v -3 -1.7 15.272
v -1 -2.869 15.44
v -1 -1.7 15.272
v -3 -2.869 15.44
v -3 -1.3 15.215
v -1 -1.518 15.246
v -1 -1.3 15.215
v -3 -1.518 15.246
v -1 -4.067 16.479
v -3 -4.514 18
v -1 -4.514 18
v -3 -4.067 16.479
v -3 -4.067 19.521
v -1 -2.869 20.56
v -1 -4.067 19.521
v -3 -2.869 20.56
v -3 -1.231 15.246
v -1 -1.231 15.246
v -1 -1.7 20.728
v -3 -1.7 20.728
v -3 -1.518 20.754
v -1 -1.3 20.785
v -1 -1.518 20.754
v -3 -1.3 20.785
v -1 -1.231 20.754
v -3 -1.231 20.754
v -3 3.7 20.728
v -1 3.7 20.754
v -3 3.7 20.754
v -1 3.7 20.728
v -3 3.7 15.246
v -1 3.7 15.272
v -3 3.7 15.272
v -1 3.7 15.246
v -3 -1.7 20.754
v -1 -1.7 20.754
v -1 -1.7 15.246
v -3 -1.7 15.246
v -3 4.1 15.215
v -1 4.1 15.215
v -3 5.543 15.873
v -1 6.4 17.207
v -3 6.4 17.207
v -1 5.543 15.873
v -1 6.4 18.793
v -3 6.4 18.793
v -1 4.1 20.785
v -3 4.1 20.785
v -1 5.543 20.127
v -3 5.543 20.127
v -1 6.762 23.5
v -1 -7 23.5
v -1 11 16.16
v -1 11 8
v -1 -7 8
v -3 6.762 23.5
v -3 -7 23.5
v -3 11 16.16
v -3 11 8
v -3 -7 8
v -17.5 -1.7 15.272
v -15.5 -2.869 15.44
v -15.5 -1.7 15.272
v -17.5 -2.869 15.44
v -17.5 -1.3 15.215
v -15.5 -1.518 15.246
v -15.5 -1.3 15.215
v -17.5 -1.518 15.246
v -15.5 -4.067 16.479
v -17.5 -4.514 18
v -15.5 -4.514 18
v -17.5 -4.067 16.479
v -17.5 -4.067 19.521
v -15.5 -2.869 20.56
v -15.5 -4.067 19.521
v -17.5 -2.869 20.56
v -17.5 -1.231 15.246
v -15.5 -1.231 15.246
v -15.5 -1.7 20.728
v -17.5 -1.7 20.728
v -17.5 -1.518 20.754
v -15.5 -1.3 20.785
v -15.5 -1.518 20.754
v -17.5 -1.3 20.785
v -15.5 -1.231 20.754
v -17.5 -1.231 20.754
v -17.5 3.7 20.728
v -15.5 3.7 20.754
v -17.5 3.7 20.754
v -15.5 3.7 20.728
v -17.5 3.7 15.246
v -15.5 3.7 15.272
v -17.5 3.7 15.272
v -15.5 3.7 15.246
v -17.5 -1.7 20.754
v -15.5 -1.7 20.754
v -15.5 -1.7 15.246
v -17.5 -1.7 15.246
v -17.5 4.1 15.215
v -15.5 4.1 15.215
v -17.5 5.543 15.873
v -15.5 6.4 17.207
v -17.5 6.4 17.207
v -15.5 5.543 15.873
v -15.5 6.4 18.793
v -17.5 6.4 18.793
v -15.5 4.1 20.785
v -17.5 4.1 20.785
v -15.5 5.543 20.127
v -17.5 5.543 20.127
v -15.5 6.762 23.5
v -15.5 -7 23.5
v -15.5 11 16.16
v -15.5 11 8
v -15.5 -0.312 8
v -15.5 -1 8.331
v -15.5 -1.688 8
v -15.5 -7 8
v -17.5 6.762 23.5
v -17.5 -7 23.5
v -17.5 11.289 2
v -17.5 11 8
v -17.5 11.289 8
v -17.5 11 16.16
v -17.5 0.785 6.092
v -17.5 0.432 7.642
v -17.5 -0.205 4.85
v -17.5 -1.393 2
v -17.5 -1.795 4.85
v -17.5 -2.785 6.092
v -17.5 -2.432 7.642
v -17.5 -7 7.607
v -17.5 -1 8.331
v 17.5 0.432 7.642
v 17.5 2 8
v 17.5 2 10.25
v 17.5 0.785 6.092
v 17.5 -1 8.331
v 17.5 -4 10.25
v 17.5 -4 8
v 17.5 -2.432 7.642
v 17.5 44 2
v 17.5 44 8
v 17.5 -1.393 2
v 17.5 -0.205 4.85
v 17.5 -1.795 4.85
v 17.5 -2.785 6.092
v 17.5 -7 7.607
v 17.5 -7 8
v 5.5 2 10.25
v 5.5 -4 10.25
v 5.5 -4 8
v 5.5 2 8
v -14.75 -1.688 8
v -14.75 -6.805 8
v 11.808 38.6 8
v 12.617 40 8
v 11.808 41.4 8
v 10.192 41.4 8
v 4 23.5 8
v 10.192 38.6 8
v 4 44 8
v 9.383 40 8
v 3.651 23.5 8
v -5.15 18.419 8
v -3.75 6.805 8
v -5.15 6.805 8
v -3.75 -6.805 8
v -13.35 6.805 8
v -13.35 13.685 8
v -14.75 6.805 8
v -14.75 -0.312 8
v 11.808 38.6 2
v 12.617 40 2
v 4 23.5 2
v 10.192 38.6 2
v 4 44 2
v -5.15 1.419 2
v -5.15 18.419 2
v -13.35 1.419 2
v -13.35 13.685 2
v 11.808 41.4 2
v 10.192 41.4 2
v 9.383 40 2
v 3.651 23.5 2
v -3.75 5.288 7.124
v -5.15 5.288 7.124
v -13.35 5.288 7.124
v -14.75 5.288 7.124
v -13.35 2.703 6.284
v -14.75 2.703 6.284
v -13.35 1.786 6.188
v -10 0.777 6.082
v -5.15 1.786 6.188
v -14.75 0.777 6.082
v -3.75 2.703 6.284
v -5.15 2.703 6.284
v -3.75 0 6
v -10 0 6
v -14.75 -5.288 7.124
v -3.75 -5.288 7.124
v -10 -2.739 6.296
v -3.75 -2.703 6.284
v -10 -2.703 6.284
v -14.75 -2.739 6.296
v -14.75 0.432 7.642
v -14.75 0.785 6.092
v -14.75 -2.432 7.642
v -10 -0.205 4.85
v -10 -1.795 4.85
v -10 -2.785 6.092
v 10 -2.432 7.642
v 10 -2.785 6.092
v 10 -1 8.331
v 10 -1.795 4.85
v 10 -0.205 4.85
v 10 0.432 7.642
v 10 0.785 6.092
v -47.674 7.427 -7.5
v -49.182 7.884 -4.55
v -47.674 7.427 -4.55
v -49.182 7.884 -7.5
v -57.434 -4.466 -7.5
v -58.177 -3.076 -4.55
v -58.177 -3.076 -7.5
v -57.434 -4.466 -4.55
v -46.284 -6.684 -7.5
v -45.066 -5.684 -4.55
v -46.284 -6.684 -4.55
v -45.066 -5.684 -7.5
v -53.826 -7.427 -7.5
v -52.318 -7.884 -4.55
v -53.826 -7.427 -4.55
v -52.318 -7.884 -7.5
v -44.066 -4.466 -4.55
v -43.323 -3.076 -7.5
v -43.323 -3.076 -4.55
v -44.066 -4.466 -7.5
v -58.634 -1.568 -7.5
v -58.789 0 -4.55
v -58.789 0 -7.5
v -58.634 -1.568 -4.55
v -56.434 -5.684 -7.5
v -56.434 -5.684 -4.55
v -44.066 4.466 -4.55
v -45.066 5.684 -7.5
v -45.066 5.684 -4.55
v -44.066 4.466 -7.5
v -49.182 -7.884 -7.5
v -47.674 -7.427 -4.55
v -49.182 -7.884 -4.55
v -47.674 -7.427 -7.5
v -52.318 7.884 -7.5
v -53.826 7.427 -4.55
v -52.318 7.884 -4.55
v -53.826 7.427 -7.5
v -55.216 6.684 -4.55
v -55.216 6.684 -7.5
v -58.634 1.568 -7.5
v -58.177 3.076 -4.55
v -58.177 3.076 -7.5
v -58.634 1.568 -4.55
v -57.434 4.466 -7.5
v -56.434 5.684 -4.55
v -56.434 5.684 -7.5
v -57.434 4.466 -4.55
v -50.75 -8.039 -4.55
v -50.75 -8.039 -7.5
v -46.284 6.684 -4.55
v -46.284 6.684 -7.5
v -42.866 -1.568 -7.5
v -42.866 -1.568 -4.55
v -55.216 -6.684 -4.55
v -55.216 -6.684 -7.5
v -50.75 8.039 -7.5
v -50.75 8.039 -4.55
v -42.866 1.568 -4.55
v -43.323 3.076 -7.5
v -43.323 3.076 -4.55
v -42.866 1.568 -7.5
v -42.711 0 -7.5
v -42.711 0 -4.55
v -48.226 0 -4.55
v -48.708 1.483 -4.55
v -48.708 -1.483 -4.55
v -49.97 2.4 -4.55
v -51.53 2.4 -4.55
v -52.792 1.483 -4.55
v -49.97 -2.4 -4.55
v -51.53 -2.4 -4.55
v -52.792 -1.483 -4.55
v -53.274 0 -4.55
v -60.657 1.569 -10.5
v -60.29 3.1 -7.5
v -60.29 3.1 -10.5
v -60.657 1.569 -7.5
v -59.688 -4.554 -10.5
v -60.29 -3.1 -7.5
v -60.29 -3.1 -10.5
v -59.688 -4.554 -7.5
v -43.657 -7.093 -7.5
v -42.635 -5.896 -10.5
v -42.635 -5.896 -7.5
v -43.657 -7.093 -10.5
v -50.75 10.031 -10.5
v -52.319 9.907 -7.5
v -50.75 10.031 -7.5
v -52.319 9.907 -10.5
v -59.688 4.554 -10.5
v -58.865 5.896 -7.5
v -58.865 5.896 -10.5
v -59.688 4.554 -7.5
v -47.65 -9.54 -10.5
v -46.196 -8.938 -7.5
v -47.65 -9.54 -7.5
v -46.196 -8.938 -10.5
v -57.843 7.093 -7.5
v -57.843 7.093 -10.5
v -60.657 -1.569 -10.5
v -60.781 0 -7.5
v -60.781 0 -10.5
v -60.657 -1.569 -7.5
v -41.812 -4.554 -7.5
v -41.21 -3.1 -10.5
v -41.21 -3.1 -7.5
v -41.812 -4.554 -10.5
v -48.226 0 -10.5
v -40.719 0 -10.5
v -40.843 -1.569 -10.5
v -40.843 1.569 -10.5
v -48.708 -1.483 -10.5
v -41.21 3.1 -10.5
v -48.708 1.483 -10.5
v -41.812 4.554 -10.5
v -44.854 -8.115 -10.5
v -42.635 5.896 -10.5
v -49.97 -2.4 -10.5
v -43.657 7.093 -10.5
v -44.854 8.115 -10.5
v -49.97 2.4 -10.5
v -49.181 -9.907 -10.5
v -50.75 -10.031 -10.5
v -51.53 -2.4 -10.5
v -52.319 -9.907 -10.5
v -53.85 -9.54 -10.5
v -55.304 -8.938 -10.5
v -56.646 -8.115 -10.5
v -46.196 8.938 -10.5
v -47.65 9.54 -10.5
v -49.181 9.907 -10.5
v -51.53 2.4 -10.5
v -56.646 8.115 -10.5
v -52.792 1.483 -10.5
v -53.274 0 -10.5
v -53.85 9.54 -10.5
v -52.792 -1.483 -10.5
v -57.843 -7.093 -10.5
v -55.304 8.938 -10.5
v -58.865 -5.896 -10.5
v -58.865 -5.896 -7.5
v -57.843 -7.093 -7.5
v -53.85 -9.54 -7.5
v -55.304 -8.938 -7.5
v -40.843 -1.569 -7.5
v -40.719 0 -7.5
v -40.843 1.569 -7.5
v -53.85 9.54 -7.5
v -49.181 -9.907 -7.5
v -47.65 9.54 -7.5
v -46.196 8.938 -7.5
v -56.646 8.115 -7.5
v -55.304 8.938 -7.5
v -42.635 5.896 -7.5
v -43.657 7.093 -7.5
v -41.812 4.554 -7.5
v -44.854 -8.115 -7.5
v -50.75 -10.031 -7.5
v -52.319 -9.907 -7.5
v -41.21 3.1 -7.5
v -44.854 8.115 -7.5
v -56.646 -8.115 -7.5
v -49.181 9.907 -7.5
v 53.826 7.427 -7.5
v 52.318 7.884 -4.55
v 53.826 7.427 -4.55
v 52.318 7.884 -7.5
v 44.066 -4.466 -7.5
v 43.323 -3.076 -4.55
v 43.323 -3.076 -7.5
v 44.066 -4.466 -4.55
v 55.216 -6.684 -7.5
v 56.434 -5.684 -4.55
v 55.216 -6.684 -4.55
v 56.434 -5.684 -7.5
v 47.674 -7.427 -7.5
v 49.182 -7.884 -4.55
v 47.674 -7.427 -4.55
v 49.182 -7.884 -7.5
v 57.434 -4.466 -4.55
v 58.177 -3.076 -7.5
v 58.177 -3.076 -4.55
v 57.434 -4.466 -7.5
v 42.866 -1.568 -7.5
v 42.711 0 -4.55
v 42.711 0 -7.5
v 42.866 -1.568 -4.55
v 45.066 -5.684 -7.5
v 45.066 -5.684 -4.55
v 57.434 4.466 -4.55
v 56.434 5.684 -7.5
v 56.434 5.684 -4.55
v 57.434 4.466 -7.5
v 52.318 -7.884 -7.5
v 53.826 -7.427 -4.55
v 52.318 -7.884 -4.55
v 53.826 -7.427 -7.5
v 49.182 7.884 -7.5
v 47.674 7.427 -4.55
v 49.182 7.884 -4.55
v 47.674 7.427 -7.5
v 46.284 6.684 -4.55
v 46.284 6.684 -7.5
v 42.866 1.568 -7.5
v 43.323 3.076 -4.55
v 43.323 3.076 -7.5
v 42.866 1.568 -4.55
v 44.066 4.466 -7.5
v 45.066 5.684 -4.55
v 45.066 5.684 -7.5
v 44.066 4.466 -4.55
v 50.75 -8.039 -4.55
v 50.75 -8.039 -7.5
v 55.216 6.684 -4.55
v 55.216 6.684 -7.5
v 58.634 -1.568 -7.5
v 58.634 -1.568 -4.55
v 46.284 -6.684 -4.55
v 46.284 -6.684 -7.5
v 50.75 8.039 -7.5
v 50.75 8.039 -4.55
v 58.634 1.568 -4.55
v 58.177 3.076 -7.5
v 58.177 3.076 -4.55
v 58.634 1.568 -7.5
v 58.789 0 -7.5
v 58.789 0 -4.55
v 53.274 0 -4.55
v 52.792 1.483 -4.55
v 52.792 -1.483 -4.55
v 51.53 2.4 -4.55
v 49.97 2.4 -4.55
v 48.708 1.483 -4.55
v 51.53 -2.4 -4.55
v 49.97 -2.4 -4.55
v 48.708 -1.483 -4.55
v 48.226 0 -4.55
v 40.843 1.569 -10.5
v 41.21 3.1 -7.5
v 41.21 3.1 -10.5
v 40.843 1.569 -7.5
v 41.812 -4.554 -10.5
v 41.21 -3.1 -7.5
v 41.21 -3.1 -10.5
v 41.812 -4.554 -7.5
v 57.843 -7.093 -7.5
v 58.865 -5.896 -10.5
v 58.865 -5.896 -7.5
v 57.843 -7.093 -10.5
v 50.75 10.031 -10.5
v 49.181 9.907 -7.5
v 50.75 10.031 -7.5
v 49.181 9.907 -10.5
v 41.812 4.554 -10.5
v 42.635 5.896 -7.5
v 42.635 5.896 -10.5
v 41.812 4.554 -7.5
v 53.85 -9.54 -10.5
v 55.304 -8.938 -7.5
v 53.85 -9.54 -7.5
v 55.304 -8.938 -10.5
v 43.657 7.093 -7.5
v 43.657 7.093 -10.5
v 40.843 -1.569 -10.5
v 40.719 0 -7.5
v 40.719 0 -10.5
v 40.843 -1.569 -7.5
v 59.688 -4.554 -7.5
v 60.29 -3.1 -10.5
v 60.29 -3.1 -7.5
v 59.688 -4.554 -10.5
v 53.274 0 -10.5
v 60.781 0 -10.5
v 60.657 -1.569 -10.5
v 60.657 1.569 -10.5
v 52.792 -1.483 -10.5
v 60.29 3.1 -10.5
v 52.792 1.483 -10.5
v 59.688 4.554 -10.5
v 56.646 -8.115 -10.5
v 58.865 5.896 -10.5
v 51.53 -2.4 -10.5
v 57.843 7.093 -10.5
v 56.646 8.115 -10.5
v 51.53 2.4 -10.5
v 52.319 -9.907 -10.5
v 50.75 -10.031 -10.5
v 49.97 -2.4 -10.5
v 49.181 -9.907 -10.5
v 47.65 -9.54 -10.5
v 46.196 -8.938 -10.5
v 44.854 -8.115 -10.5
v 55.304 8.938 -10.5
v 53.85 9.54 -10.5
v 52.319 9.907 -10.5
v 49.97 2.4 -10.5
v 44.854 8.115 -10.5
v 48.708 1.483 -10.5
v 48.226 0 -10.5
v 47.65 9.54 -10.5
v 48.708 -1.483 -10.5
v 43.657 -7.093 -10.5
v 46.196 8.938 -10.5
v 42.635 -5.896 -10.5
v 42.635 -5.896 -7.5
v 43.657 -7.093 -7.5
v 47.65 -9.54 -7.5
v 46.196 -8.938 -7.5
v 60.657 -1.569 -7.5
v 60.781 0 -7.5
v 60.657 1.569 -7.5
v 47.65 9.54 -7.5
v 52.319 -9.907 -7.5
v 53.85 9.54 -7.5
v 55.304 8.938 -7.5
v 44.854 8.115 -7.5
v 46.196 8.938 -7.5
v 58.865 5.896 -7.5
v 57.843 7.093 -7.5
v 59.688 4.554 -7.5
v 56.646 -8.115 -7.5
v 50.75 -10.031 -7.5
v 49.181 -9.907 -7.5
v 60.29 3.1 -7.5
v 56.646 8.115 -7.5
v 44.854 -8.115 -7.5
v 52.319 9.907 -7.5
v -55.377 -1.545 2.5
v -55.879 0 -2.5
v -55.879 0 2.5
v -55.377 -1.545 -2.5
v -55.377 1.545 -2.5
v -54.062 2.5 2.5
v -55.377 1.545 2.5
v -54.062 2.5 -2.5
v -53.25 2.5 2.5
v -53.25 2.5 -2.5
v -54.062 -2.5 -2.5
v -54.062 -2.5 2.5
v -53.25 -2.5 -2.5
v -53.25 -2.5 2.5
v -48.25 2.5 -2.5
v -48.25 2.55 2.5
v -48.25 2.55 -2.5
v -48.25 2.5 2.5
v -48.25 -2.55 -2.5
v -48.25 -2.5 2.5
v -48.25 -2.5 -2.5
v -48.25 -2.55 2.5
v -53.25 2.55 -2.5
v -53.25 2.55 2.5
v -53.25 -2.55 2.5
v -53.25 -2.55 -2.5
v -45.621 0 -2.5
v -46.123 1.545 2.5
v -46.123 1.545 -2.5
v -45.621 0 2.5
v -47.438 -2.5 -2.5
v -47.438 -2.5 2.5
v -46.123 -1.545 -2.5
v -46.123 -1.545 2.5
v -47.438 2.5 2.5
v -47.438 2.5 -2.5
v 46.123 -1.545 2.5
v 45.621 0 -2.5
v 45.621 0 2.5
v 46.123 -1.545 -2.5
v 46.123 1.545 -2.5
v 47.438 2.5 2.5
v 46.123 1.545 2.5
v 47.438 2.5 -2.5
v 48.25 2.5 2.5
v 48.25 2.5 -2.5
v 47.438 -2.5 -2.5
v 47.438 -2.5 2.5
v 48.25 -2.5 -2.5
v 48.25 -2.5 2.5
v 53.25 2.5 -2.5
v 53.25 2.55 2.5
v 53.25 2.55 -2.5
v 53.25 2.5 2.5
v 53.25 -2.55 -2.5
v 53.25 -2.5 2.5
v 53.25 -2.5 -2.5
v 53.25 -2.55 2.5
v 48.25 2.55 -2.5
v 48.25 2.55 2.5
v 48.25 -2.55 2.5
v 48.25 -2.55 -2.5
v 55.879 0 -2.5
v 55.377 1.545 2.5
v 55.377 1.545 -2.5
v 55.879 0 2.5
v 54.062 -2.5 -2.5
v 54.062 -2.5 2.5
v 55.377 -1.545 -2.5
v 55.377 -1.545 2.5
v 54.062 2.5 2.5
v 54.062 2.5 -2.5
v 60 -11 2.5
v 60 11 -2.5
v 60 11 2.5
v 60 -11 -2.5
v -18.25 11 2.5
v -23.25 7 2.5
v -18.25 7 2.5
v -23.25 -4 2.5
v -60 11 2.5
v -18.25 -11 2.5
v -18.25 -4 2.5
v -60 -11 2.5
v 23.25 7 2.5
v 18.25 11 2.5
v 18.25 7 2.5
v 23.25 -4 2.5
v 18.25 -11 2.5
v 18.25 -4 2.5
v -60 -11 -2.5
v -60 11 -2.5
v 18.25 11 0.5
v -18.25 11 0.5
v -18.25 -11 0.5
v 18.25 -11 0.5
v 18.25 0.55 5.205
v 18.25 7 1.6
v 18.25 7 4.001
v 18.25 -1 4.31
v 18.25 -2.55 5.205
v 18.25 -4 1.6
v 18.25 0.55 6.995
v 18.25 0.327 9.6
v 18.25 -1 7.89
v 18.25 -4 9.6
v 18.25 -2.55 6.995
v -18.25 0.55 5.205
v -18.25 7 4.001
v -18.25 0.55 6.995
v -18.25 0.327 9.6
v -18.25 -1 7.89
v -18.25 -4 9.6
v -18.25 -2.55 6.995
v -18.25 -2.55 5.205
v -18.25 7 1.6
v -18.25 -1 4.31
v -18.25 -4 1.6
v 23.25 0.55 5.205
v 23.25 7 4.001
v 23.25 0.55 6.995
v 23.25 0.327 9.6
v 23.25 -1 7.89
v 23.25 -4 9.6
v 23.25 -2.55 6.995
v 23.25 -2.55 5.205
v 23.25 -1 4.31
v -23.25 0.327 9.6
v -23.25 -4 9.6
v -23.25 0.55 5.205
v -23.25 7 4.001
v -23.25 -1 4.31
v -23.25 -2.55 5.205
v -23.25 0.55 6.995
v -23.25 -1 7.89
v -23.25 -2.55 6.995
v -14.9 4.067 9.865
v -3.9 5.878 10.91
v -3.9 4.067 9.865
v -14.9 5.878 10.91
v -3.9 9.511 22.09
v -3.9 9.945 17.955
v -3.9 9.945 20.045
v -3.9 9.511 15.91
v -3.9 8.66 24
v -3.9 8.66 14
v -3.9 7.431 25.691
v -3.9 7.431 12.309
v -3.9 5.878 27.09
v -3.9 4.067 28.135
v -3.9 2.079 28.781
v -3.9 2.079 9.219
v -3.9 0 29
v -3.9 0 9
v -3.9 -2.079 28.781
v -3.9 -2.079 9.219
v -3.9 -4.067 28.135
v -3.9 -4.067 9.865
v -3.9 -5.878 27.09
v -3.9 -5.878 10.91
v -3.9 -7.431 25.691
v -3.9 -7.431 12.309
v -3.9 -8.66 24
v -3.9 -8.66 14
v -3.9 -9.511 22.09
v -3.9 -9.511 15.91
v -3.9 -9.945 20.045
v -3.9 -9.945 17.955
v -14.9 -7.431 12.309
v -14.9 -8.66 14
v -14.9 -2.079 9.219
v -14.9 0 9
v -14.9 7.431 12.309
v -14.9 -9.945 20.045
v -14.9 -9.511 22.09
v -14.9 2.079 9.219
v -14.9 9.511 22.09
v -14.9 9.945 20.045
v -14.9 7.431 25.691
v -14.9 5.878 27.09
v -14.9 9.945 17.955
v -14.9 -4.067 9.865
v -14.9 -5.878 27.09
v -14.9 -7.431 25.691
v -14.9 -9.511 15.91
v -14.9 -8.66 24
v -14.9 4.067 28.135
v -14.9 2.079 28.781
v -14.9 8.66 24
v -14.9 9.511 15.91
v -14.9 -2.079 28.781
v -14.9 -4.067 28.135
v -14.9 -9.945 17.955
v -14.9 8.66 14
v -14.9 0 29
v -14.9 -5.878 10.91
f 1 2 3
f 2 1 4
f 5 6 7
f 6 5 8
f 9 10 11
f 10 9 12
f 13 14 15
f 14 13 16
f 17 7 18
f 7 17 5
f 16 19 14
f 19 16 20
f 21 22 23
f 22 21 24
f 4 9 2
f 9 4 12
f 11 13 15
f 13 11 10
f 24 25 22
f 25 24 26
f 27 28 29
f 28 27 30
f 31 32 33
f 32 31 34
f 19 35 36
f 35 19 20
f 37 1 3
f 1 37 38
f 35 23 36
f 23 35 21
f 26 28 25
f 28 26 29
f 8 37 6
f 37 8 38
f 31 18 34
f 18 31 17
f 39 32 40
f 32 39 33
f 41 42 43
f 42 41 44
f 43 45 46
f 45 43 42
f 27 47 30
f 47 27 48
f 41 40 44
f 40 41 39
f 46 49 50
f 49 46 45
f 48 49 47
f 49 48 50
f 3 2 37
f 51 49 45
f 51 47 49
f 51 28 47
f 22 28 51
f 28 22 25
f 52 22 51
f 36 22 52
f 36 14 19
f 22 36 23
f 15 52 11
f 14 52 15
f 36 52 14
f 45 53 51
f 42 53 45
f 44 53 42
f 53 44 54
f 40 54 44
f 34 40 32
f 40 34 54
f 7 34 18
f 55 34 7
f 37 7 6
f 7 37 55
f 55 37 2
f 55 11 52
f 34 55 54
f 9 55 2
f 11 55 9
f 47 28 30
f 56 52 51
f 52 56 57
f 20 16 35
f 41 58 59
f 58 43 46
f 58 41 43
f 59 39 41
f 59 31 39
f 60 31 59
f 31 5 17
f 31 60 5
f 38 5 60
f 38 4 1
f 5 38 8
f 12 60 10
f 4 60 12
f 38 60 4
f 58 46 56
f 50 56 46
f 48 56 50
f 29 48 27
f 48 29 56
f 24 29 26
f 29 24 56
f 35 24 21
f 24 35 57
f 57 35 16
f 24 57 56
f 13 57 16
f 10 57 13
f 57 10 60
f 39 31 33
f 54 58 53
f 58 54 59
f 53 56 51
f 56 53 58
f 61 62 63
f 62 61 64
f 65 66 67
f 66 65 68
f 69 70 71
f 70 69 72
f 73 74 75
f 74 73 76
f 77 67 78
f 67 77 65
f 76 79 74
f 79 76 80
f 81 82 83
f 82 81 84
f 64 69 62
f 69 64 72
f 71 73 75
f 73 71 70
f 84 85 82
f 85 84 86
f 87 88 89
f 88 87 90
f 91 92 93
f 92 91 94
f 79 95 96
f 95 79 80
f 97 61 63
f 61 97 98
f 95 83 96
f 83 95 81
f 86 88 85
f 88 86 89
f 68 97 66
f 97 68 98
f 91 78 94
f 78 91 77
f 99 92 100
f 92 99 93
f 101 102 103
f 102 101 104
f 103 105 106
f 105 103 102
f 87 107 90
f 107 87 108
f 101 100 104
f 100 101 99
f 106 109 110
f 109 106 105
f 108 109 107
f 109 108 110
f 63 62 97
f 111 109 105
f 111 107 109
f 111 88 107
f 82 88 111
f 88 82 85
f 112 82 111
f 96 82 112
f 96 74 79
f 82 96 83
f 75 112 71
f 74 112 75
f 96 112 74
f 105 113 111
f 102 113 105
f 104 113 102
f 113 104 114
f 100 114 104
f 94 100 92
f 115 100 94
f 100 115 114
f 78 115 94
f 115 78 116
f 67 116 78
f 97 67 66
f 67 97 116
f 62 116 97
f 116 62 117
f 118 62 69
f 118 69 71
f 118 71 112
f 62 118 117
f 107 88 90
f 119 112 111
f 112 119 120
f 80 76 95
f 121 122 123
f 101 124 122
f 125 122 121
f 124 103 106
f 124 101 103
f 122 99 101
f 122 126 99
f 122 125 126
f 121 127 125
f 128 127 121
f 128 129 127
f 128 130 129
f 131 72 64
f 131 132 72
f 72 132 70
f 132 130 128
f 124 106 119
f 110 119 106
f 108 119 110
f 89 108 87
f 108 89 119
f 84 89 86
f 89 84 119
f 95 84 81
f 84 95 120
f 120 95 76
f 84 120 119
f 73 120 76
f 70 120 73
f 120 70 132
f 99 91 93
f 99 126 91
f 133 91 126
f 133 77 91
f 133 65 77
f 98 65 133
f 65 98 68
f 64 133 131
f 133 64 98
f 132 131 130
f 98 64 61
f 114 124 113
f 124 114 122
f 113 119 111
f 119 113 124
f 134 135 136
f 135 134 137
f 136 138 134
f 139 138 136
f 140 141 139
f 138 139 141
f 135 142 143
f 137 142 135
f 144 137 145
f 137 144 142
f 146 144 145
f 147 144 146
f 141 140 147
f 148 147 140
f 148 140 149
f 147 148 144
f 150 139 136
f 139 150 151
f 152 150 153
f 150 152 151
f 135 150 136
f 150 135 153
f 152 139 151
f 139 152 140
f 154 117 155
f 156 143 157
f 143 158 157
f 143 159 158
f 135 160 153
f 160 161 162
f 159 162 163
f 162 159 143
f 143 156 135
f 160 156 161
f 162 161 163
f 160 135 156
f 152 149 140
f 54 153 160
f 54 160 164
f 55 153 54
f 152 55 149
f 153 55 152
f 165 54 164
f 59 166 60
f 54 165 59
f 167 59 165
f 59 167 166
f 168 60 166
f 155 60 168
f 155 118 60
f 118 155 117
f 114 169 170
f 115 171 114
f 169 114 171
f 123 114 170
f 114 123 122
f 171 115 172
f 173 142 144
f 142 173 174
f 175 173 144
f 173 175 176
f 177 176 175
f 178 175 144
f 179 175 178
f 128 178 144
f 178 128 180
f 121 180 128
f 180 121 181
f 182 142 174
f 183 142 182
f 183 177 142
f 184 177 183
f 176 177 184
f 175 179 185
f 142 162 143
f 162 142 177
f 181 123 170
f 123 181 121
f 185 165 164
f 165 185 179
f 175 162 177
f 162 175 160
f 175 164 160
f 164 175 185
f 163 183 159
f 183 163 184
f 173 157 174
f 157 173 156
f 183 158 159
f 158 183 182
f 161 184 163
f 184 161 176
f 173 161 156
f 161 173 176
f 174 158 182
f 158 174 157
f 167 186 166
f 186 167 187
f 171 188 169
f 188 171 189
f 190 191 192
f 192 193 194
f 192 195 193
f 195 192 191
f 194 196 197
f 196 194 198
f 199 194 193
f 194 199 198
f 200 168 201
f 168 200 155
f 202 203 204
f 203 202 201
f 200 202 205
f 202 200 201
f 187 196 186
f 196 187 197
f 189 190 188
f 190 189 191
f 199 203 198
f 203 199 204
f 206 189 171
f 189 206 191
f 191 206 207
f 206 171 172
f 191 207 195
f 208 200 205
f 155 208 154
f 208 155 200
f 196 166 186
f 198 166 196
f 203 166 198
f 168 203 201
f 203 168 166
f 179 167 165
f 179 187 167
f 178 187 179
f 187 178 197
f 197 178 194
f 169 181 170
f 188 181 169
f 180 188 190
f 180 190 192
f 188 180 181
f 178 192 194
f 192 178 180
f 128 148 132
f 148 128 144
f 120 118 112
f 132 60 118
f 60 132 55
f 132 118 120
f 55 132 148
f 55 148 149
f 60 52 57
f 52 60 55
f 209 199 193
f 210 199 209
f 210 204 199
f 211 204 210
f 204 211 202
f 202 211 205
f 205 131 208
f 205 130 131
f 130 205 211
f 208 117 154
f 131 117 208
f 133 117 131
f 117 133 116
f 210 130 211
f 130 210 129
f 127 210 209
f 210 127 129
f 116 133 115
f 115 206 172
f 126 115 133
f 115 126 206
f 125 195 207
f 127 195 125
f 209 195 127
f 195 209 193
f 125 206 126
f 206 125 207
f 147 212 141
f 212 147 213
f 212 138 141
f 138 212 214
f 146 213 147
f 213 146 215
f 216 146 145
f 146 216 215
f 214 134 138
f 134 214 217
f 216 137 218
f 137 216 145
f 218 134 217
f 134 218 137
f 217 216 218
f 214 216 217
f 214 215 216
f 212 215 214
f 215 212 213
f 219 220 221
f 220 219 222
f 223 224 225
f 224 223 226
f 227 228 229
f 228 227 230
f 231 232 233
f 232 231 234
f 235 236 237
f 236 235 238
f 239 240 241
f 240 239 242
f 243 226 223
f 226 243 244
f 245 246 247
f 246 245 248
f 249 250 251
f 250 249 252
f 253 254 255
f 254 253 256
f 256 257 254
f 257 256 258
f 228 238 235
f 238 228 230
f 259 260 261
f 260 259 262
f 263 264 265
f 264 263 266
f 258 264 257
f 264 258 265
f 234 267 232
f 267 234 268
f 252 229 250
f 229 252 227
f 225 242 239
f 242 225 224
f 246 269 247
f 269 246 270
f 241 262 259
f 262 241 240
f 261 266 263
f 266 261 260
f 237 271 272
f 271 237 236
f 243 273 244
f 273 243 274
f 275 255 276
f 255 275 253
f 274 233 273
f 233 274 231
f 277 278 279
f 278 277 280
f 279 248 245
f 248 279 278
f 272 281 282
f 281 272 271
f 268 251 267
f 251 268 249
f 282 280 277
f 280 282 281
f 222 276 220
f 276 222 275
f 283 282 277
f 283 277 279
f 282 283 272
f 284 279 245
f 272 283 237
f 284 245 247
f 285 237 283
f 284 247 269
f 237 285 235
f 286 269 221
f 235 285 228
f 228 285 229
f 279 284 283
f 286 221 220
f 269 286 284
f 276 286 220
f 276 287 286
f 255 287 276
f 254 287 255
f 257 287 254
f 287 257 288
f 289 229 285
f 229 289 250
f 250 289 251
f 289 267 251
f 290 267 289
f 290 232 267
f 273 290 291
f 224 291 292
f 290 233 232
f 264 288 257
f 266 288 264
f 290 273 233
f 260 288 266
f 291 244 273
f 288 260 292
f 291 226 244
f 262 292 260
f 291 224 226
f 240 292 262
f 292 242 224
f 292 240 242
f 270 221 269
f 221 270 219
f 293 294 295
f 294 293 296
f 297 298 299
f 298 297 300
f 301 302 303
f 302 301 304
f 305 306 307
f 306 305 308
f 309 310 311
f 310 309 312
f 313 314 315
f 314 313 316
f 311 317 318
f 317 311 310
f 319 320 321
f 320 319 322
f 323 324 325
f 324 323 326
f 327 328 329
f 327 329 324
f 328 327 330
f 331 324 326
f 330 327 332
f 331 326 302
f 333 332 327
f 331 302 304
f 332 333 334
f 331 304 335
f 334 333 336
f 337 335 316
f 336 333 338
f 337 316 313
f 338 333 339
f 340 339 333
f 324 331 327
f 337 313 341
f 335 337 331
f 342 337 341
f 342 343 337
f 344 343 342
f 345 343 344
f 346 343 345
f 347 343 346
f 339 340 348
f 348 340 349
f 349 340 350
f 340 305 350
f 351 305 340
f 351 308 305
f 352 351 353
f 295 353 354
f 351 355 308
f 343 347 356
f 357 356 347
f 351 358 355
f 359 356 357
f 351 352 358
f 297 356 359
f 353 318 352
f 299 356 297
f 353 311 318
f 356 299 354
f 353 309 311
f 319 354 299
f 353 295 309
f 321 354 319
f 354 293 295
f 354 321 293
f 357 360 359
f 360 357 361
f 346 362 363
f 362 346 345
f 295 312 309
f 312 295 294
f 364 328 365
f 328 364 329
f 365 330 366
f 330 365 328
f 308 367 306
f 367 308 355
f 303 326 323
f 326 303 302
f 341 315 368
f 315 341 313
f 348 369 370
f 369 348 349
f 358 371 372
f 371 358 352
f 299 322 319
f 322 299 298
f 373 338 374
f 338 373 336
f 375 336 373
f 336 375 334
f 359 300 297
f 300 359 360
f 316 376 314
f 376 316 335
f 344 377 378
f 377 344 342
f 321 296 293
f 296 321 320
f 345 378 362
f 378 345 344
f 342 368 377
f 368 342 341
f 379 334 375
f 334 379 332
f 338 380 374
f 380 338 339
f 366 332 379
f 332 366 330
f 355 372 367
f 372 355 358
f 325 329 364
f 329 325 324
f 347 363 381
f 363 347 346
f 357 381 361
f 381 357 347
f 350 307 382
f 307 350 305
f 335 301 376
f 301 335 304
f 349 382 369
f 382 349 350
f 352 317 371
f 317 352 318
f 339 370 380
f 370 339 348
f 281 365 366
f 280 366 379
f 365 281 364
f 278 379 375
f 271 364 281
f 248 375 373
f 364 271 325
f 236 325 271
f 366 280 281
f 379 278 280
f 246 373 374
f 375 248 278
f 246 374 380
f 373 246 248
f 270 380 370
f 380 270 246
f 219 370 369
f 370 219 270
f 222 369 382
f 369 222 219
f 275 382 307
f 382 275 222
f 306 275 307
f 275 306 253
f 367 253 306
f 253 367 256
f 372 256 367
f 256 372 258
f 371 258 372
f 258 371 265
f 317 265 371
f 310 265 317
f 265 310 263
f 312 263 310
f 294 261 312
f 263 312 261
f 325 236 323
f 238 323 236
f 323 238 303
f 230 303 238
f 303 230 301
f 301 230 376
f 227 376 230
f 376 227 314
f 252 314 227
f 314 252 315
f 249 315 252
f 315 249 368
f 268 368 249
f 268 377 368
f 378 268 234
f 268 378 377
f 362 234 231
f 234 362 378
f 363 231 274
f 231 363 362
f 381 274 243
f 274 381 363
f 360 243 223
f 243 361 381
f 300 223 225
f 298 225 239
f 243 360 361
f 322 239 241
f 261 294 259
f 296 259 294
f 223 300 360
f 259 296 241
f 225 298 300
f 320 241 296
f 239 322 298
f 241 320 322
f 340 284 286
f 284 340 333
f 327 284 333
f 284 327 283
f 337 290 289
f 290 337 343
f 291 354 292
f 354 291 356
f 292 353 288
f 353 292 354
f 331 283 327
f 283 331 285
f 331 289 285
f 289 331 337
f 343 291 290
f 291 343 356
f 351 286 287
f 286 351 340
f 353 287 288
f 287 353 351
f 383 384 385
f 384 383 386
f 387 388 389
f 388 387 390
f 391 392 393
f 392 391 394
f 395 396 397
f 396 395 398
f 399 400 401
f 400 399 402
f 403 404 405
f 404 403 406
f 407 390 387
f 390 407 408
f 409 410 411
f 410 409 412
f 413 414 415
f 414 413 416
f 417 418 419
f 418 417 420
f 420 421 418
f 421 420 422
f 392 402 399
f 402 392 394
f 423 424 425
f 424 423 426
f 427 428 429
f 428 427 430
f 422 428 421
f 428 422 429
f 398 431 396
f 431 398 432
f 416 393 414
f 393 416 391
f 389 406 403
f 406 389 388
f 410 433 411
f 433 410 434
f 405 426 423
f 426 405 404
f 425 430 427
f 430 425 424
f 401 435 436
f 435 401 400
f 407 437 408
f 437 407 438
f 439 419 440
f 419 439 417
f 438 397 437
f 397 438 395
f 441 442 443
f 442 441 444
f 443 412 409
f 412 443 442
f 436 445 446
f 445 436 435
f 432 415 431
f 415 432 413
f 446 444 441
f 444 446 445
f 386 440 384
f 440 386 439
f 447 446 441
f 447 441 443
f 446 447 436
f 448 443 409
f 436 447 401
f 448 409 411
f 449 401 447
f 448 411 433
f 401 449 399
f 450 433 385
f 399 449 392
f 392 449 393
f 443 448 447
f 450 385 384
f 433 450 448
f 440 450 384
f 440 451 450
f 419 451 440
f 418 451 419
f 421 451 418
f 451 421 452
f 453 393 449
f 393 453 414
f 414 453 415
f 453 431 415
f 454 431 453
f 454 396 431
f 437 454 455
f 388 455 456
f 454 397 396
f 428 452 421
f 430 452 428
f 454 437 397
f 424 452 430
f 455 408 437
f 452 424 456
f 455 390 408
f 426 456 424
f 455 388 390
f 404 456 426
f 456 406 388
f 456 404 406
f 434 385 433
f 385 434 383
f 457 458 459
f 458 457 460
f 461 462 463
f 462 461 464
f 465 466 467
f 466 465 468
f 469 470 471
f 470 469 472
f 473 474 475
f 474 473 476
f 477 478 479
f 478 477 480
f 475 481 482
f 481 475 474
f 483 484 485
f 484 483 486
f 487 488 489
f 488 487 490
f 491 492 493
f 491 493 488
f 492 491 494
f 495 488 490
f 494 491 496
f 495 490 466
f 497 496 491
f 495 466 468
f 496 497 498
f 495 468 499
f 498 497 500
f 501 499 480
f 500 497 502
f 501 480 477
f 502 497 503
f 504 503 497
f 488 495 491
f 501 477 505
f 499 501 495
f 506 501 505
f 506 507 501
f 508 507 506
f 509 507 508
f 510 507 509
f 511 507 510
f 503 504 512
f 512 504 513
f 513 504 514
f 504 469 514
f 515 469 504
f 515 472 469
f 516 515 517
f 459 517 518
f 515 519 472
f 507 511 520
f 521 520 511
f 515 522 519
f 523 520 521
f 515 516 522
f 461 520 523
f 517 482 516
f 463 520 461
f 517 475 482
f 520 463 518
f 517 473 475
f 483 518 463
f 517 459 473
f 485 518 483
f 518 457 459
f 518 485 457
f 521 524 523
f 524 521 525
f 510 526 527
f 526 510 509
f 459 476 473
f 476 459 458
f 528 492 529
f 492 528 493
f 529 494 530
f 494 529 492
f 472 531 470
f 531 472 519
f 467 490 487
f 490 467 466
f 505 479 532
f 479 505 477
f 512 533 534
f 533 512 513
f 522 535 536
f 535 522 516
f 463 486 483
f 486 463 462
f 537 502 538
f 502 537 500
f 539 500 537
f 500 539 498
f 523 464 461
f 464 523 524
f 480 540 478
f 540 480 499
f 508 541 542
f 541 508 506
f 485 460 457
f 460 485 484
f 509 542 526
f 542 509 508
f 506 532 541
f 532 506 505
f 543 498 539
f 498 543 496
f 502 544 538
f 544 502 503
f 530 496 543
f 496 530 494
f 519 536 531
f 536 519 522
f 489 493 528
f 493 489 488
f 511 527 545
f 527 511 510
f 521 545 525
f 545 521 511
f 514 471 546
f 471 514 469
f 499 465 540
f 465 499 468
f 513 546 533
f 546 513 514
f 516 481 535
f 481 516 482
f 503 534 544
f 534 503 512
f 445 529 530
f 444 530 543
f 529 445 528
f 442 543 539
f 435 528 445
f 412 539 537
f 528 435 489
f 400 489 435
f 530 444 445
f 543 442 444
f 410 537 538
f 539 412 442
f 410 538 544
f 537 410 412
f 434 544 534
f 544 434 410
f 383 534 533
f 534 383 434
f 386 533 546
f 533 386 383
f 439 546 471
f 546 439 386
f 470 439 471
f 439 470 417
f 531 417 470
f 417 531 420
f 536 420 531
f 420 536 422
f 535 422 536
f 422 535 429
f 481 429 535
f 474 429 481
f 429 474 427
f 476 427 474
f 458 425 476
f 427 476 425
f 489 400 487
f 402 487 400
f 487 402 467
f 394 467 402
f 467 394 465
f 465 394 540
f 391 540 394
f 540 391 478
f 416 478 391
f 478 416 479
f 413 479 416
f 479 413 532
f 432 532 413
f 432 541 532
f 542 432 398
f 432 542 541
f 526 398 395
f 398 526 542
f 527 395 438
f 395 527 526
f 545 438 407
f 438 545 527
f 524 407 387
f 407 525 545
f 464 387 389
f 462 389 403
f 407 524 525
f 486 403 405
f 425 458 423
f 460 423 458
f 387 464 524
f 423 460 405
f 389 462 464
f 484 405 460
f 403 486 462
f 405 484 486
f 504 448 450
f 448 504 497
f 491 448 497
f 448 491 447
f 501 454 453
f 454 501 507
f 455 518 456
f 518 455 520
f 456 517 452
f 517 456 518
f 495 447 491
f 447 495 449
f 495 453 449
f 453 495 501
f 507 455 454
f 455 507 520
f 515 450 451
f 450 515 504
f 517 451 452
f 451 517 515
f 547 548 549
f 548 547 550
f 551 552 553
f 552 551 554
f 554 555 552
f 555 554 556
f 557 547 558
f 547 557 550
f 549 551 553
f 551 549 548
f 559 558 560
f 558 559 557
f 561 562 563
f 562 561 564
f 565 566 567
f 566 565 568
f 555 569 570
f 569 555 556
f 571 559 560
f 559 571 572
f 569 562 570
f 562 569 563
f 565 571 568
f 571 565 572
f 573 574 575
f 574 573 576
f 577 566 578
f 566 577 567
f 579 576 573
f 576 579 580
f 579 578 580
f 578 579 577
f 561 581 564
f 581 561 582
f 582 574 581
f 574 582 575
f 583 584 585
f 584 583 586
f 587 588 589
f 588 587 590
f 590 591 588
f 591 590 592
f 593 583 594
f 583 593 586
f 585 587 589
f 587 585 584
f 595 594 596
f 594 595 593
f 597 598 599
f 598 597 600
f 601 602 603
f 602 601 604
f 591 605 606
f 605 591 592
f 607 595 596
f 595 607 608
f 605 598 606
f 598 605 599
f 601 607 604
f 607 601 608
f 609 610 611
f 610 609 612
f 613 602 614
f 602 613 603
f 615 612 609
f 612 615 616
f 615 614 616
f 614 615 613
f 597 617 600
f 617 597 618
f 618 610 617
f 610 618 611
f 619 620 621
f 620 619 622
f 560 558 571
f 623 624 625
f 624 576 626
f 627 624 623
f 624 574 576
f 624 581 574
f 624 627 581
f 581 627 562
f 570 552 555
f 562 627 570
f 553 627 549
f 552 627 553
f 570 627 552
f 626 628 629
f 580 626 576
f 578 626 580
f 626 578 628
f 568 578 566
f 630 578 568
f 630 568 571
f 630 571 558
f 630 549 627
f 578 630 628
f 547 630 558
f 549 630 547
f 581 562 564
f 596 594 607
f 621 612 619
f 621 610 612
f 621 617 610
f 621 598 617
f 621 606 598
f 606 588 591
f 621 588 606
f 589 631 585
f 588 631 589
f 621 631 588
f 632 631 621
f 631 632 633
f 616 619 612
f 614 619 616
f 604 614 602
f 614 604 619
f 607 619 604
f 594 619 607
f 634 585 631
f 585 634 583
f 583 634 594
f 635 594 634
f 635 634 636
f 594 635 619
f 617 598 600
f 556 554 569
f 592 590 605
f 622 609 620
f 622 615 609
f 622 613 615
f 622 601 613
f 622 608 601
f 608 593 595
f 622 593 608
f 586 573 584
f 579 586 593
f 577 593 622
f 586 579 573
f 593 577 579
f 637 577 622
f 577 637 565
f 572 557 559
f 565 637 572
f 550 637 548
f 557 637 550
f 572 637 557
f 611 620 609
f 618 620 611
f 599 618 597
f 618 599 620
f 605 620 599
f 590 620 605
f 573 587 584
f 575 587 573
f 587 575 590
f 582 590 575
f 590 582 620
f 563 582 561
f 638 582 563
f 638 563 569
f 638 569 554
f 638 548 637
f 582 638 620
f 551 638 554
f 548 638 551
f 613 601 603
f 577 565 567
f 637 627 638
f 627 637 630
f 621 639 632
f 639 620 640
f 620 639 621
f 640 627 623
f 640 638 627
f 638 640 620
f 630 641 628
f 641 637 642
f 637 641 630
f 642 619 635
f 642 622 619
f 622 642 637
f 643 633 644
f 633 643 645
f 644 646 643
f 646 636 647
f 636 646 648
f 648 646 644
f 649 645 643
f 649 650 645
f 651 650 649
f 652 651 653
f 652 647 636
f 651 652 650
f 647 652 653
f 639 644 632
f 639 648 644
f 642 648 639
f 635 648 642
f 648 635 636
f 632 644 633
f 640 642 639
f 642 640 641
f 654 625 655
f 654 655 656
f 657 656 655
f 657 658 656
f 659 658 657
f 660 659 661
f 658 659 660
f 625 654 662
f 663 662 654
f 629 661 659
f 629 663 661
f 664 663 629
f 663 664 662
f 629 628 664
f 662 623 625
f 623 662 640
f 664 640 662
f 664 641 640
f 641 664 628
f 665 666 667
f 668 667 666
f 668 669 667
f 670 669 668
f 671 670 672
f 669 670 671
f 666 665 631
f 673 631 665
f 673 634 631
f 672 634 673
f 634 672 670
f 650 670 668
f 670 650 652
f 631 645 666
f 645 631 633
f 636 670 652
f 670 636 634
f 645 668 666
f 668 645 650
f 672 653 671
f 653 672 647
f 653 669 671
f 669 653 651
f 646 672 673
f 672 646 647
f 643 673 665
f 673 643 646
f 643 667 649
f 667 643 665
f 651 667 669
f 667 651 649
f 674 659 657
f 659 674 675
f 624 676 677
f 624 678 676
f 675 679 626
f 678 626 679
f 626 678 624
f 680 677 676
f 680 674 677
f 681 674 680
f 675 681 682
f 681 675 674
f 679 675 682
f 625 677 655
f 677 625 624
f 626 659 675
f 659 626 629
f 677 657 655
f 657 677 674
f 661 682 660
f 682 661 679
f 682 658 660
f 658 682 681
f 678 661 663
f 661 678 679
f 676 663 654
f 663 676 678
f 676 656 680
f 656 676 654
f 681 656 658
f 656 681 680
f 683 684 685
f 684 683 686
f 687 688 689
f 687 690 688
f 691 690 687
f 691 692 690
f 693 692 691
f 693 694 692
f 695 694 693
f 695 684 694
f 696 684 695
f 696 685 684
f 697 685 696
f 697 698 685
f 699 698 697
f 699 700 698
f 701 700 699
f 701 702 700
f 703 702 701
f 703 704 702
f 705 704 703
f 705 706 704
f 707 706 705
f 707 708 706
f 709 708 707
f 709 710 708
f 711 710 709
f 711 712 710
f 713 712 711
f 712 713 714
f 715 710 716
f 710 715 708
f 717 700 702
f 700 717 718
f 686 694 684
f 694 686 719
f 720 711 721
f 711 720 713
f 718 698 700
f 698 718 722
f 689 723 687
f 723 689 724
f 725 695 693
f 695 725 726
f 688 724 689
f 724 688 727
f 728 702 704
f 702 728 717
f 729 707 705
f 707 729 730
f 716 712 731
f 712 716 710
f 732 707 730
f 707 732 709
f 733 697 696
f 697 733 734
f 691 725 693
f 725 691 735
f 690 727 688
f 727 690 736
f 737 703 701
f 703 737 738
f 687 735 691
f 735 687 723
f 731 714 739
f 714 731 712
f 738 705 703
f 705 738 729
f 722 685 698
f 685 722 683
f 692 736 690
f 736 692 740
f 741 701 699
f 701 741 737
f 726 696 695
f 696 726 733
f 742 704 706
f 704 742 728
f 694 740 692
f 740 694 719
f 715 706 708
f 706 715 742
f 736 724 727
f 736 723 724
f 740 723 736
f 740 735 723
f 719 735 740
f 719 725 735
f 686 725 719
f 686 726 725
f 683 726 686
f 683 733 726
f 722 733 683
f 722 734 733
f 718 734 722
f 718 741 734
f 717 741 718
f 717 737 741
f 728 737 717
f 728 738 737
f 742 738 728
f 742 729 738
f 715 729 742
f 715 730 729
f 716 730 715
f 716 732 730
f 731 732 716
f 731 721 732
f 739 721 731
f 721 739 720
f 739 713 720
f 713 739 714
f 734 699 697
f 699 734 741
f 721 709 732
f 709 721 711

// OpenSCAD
//Y-Belt tensioner for a Velleman K8200 / 3Drag 3D Printer
//Designed by: http://www.thingiverse.com/sampeople

//HOW TO PRINT
//Export each part individually (except the washers, both can be done together)
//to an stl file, by commenting out different portions at the end of this file. 
//
//Assemble them on the platter inside your favourite slicer program.
//Slice, print, enjoy (etc).
//

//
//=======================================================================================
//polyhole module by nophead: http://www.thingiverse.com/thing:6118
module polyhole(h, d) {
    n = max(round(2 * d),3);
    rotate([0,0,180])
        cylinder(h = h, r = (d / 2) / cos (180 / n), $fn = n,center=true);
}
//End polyhole
//=======================================================================================
//Pulley Clearance
module pulley(d,h)
{
rotate([0,90,0])cylinder(d=d,h=h,center=true,$fn=30);
}
//End pulley
//=======================================================================================
//Slotted Holes
module slottedhole(d,h)
{
translate([-d/2,0,0])polyhole(d=d,h=h);
cube([d,d+d/50,h],center=true);
translate([d/2,0,0])polyhole(d=d,h=h);
}
//End Slotted Holes
//=======================================================================================
//Washers
module washers()
	{
		difference()
			{
				union()
					{
						translate([0,0,2.9])polyhole(d=16,h=3.1);
						polyhole(d=20,h=3);
					}
				polyhole(d=4.8,h=10); //comment this line out
				//slottedhole(d=4.6,h=10); //and uncomment this line for slotted washer holes
			}
	}
//End Washers
//=======================================================================================
//The Tensioner
module tensioner()
	{
		module bearing_mounts()
			{
				difference()
					{
						cube([2,22,17],center=true);
						translate([0,1,3])rotate([90,0,90])slottedhole(d=5.4,h=60); //slotted holes
						//translate([0,0,3])rotate([0,90,0])polyhole(d=5.6,h=60); //round holes
						translate([0,16,7.5])rotate([-60,0,0])cube([8,22,15],center=true);
					}
			}
			
			difference()
				{
					union()
						{
							translate([-2,0,15])bearing_mounts();
							translate([-16.5,0,15])bearing_mounts();
							translate([11.5,-1,9])cube([12,6,2.5],center=true);
							translate([0,16.5,5])cube([35,55,6],center=true); //main bit
						} 
					translate([-18,11,0])rotate([0,0,30])cube([25,30,15]); //angled bit
					translate([-21,23.5,0])cube([25,30,15]); //top
					translate([11,40,6.5])polyhole(d=2.8,h=10); //tension screw
					translate([-9.25,0,19])pulley(d=26,h=11);
					translate([-9.25,12,8.2])rotate([-5,0,0])cube([8.2,20,15],center=true); //belt cutout
					translate([0,-10,0])rotate([-45,0,0])cube([50,20,15],center=true);
					translate([0,-17,16])cube([50,20,17],center=true);
					translate([-15,-1,6.5])rotate([0,90,0])polyhole(d=3.3,h=10); //hinge hole
					translate([15,-1,6.5])rotate([0,90,0])polyhole(d=3.3,h=10); //hinge hole
				}	
	}
//End Tensioner
//=======================================================================================
//The Base
module base()
	{
		module tens_mounts()
			{
					difference()
						{
							cube([5,11,8],center=true);
							translate([0,5,6])rotate([50,0,0])cube([7,11,11],center=true);
							translate([0,-2.5,0.5])rotate([0,90,0])polyhole(d=3.1,h=80);
						}
			}
		union()
			{
				difference()
					{
					cube([120,22,5],center=true); //main bit
					translate([0,0,2])cube([36.5,30,3],center=true);
					translate([-50.75,0,0])slottedhole(d=5,h=10);
					translate([50.75,0,0])slottedhole(d=5,h=10);
					}
				translate([20.75,1.5,5.6])tens_mounts();
				translate([-20.75,1.5,5.6])tens_mounts();
			}
	}



//End Base
//=======================================================================================


module design()
{
//pulley standin do not print this part. used only for design and included if
//position of pully needs to be adjusted later
translate([-9.4,0,19])pulley(d=20,h=11); //creates a mock pulley to assist in positioning

//The Tensioner
tensioner(); 

//Washers
translate([-50.75,0,-9])washers();
translate([50.75,0,-9])washers();

//Main Base
base();
}

design(); //comment out this line to hide the assembled thing

//uncomment these things individually to export one at a time
//washers(); //you'll want two of these
//base();
//tensioner();
